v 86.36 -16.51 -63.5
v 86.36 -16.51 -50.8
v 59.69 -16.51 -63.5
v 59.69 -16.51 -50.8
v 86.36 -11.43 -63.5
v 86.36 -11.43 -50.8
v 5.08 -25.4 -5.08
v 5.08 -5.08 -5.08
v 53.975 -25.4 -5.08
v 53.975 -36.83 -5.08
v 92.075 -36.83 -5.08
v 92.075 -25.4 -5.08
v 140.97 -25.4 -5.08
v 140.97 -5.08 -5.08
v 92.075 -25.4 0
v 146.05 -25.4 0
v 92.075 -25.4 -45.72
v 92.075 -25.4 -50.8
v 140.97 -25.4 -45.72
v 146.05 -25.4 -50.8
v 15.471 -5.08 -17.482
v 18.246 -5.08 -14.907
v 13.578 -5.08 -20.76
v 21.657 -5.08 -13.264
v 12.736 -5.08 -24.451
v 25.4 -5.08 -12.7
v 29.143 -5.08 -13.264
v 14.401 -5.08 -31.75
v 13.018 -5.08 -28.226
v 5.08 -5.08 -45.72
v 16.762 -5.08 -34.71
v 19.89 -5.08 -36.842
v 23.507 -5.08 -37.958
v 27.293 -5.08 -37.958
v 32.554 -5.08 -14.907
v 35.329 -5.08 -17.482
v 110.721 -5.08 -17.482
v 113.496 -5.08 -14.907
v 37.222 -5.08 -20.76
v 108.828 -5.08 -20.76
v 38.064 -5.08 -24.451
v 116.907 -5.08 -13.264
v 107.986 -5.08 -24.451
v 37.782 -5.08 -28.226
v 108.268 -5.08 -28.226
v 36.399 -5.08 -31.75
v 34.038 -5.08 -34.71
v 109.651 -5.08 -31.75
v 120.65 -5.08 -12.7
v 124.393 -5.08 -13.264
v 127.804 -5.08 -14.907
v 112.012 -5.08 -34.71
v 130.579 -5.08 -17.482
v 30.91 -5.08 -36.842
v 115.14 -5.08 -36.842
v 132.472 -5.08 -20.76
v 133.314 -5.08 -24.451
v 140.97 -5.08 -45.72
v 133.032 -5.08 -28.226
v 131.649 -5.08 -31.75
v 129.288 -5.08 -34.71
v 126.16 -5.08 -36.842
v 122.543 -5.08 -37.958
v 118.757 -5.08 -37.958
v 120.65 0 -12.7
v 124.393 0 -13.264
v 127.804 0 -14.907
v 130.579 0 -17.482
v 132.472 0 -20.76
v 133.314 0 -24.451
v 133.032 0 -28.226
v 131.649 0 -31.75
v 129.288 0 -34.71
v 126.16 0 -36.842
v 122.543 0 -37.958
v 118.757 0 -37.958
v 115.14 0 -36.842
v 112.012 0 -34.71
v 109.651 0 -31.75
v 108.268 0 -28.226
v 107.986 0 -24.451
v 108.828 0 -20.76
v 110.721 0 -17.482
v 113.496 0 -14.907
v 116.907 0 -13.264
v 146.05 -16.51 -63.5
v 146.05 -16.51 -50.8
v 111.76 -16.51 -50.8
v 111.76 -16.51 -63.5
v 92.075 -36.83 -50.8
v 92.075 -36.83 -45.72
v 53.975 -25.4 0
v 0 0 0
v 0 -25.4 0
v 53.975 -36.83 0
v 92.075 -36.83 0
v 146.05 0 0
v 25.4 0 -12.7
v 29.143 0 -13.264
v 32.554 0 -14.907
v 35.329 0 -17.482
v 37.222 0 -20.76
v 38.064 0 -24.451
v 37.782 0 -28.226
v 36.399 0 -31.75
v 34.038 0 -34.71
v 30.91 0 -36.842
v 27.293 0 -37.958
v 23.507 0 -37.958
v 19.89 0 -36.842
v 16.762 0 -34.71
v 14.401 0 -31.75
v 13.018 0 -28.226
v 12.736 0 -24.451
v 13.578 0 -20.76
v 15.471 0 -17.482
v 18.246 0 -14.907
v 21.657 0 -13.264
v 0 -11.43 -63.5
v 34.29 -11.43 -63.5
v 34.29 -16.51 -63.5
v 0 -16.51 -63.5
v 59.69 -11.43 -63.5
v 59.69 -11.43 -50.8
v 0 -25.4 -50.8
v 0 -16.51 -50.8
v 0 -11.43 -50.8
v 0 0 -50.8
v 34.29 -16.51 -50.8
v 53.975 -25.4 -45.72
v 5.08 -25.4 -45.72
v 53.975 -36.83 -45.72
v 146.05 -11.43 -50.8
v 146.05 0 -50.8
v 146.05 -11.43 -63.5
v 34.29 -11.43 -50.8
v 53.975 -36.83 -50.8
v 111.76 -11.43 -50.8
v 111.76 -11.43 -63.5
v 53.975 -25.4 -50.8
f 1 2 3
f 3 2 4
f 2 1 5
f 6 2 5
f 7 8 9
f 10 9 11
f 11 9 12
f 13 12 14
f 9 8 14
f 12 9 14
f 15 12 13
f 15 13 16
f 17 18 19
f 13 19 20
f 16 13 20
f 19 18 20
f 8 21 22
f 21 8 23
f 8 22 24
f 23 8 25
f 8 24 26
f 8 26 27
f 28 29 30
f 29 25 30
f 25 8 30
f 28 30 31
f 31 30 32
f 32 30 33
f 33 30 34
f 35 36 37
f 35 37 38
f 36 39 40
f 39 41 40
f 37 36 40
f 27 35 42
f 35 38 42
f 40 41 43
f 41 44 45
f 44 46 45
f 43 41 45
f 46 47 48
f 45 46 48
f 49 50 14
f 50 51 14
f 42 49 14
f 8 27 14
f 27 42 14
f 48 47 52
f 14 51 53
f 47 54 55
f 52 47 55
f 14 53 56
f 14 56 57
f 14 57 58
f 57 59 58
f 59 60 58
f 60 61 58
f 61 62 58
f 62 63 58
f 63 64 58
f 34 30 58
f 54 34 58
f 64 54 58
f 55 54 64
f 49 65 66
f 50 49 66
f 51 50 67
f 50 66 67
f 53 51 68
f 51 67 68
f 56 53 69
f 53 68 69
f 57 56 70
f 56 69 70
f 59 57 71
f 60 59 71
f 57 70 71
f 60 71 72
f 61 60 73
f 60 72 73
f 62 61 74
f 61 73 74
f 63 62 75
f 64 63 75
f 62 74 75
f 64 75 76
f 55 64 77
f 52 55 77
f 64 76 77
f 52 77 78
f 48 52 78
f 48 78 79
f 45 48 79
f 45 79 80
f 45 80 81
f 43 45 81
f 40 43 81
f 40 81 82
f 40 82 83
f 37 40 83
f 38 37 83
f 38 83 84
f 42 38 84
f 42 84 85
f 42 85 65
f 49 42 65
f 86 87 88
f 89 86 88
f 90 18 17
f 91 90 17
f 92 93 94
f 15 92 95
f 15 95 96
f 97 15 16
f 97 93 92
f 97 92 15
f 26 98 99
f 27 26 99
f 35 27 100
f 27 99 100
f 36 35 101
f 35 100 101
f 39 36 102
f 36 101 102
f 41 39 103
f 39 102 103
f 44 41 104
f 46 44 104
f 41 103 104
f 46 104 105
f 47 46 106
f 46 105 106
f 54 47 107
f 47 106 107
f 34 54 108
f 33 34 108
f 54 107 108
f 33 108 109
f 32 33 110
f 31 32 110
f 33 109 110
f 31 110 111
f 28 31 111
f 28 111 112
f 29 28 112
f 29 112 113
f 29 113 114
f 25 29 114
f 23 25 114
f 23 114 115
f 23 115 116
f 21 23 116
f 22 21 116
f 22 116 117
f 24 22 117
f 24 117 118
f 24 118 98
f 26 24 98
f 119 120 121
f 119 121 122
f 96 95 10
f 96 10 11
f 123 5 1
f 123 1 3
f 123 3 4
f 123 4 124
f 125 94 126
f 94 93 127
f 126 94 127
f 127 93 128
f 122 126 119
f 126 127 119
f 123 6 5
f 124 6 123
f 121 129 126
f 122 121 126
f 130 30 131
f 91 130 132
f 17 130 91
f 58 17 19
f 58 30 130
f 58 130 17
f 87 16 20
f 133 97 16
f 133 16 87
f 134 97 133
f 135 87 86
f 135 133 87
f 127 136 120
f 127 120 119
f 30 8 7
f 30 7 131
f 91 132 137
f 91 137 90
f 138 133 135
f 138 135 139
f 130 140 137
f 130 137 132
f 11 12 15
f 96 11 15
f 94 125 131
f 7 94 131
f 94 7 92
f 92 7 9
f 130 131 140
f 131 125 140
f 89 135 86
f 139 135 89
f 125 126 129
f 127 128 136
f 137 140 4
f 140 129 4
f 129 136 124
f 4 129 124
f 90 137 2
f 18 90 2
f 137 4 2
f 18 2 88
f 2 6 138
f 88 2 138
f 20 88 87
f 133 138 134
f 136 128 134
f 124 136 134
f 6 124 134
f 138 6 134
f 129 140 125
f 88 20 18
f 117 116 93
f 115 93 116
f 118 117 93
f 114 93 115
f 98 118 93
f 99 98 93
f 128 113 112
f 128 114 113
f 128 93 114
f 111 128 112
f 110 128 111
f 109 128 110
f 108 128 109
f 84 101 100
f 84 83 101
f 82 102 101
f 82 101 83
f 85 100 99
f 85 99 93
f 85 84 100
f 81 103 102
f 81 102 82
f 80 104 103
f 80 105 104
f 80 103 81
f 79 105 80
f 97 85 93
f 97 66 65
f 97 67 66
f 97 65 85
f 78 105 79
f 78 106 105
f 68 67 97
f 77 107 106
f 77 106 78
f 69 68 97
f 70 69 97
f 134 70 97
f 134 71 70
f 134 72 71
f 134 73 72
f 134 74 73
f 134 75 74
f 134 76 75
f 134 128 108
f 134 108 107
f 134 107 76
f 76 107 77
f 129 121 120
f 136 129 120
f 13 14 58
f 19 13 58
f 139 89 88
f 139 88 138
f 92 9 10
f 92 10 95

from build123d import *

# Parameters (mm, degrees)
SKETCH3_W           = 146.05
SKETCH3_H           = 50.8
BOSS_EXTRUDE1_DEPTH = 25.4
SHELL1_T            = -5.08
SKETCH4_R           = 12.7
CUT_EXTRUDE1_DEPTH  = 6.35
SKETCH5_W           = 19.05
SKETCH5_H           = 5.08
BOSS_EXTRUDE2_DEPTH = 11.43
SKETCH6_W           = 34.29
SKETCH6_H           = 5.08
SKETCH6_W_2         = 26.67
BOSS_EXTRUDE3_DEPTH = 12.7


with BuildPart() as part:
    # Sketch3 → Boss-Extrude1 (new body)
    with BuildSketch(Plane(origin=(0, 0, 0), x_dir=(1, 0, 0), z_dir=(0, 1, 0))):
        with Locations((73.025, 25.4)):
            Rectangle(SKETCH3_W, SKETCH3_H)
    extrude(amount=-BOSS_EXTRUDE1_DEPTH)

    # Shell1
    shell1_openings = [part.faces().sort_by_distance(p)[0] for p in [
        (73.025, -25.4, -25.4),
    ]]
    offset(amount=SHELL1_T, openings=shell1_openings, kind=Kind.INTERSECTION)

    # Sketch4 → Cut-Extrude1 (cut)
    with BuildSketch(Plane(origin=(0, 0, 0), x_dir=(1, 0, 0), z_dir=(0, 1, 0))):
        with Locations(Location((25.4, 25.4, 0), (0, 0, 270))):  # turned: the seam where the file's is
            Circle(SKETCH4_R)
        with Locations(Location((120.65, 25.4, 0), (0, 0, 270))):  # turned: the seam where the file's is
            Circle(SKETCH4_R)
    extrude(amount=-CUT_EXTRUDE1_DEPTH, mode=Mode.SUBTRACT)

    # Sketch5 → Boss-Extrude2 (add)
    with BuildSketch(Plane.XZ.offset(25.4)):
        with Locations((82.55, -2.54)):
            Rectangle(SKETCH5_W, SKETCH5_H)
        with Locations((63.5, -2.54)):
            Rectangle(SKETCH5_W, SKETCH5_H)
        with Locations((82.55, -48.26)):
            Rectangle(SKETCH5_W, SKETCH5_H)
        with Locations((63.5, -48.26)):
            Rectangle(SKETCH5_W, SKETCH5_H)
    extrude(amount=BOSS_EXTRUDE2_DEPTH)

    # Sketch6 → Boss-Extrude3 (add)
    with BuildSketch(Plane(origin=(0, 0, -50.8), x_dir=(-1, 0, 0), z_dir=(0, 0, -1))):
        with Locations((-128.905, -13.97)):
            Rectangle(SKETCH6_W, SKETCH6_H)
        with Locations((-73.025, -13.97)):
            Rectangle(SKETCH6_W_2, SKETCH6_H)
        with Locations((-17.145, -13.97)):
            Rectangle(SKETCH6_W, SKETCH6_H)
    extrude(amount=BOSS_EXTRUDE3_DEPTH)


solid = part.part
